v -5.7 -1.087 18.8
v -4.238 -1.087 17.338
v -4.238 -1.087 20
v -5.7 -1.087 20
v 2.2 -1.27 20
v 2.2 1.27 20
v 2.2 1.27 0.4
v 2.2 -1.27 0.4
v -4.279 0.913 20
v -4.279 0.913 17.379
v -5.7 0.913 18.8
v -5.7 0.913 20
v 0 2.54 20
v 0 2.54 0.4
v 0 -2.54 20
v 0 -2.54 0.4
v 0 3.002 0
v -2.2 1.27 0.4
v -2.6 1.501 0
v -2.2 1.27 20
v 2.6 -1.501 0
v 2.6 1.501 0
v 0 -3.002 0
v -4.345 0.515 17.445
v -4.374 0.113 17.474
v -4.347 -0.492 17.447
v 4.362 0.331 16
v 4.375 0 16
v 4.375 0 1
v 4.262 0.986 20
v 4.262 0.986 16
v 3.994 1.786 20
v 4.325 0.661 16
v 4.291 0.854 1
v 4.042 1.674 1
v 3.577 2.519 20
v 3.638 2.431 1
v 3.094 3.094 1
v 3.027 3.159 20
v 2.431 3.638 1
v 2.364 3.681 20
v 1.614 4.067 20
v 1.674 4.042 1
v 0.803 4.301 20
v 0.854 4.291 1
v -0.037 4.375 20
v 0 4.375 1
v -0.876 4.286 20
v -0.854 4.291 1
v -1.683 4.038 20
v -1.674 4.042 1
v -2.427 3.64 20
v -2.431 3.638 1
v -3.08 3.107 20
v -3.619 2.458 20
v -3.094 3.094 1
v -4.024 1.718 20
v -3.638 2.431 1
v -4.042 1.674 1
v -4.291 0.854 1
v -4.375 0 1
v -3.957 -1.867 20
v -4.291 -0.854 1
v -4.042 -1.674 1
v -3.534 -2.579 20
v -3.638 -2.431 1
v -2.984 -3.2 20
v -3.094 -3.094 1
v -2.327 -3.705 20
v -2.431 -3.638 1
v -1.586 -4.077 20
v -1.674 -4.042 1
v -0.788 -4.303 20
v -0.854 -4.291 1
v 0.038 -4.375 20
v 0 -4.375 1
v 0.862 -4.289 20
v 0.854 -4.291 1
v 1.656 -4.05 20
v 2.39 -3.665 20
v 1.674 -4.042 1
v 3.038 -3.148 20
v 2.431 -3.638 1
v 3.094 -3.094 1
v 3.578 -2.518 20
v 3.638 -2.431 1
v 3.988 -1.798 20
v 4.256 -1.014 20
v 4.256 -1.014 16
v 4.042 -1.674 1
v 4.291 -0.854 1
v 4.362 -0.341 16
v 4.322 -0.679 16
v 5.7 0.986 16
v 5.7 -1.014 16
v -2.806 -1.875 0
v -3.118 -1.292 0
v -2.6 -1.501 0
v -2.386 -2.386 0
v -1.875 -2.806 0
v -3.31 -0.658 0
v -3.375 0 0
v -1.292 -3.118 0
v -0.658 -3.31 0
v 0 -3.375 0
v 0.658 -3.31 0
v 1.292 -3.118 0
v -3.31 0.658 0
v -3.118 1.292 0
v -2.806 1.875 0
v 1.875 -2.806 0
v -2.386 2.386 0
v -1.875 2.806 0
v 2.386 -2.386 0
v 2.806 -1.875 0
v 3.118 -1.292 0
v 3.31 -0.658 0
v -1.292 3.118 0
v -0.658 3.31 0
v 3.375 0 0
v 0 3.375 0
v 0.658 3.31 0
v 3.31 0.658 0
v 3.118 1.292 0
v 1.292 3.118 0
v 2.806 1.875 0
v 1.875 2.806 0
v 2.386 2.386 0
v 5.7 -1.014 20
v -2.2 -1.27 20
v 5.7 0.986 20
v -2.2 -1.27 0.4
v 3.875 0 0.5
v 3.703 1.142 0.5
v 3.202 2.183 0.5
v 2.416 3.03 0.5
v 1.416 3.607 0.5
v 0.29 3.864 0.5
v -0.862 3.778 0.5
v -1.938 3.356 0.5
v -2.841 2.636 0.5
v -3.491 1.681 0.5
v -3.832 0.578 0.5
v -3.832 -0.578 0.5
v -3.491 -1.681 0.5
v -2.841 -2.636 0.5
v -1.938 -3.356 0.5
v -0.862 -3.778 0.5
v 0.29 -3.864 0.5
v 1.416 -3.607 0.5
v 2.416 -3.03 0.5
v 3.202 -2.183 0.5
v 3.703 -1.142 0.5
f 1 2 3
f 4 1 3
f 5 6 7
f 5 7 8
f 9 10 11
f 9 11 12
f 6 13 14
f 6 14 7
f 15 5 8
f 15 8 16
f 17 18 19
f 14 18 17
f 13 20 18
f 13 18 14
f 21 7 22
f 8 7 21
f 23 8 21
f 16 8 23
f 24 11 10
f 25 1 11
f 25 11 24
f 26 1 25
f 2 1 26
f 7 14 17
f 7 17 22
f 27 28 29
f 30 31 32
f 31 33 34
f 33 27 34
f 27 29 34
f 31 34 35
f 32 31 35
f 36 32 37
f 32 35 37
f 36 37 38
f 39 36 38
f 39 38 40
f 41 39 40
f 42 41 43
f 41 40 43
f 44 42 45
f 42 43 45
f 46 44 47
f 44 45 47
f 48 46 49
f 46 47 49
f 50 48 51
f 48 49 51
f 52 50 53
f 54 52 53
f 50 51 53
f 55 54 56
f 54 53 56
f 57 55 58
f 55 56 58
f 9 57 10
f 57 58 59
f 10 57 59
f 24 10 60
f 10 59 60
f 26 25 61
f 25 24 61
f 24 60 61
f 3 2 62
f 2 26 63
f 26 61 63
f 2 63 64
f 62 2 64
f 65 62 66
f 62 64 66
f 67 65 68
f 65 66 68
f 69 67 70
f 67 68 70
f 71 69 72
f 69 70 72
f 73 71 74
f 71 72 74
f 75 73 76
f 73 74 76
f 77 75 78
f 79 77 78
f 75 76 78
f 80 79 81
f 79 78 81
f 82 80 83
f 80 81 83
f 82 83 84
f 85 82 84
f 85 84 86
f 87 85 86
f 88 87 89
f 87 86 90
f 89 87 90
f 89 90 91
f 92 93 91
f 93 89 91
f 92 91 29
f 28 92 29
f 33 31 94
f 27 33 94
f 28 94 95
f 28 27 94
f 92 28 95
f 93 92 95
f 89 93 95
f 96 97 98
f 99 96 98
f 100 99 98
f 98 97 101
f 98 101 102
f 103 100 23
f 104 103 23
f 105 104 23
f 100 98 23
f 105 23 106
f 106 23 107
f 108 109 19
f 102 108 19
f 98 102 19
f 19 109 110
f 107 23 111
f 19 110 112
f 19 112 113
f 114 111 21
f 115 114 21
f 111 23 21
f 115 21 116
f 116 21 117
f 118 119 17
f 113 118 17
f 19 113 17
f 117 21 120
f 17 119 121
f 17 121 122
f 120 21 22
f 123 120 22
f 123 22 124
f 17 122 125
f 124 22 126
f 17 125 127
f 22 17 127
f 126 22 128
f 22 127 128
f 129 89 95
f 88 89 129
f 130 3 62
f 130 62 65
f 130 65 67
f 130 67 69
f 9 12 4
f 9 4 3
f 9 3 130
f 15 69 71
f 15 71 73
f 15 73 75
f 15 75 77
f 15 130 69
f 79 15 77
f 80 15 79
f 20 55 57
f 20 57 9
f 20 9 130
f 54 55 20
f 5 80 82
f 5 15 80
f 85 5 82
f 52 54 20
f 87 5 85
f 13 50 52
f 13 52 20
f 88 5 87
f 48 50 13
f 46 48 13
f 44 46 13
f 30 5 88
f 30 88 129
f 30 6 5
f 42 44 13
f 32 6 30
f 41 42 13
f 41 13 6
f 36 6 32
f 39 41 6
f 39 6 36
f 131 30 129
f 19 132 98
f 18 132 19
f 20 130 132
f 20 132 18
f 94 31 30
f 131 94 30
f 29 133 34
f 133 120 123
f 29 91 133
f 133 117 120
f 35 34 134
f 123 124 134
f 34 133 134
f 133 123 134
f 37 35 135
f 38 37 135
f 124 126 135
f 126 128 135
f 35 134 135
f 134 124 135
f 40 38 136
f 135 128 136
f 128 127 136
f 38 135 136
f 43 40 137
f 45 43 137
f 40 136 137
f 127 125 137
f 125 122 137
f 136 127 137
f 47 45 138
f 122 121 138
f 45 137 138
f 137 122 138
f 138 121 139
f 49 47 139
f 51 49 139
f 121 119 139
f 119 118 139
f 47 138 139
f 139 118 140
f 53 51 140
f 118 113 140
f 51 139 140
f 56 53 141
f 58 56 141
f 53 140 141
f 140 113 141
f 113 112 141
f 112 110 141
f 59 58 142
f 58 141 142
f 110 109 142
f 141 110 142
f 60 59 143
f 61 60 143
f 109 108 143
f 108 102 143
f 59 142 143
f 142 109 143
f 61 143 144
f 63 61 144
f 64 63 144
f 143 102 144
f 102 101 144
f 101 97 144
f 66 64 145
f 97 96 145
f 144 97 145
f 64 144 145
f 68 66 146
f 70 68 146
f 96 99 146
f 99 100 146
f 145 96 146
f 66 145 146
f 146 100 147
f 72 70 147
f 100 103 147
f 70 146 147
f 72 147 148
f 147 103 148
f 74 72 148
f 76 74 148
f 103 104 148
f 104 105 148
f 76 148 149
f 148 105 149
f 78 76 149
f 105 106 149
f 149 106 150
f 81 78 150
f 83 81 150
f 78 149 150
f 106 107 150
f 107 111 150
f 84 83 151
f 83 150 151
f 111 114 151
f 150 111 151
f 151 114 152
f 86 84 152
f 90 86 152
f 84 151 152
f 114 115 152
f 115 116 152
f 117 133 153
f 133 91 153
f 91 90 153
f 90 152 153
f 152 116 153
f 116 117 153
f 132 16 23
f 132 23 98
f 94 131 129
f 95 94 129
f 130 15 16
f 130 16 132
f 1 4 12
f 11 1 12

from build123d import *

# Parameters (mm, degrees)
F0_R        = 4.375
F1_DEPTH    = 20
F2_W        = 2
F2_H        = 4
F3_DEPTH    = 3.5
F4_W        = 2
F4_H        = 4
F5_DEPTH    = 3.5
F6_T4_DEPTH = 16.4014247326
F6_S5_R     = 4.375
F6_T6_DEPTH = 10
F7_SIZE     = 1
F8_SIZE     = 0.4


# Not quite as in the source:
# - a fillet or chamfer that OpenCascade refuses, or shapes differently, is made with other operations: its cross-section is extruded or revolved along the edge and cut away or added


with BuildPart() as f1:
    # F0 (on Top) → F1 (new body)
    with BuildSketch(Plane.XY):
        Circle(F0_R)
        Polygon((-2.2, -1.2701705922), (-2.2, 1.2701705922), (0, 2.5403411844), (2.2, 1.2701705922), (2.2, -1.2701705922), (0, -2.5403411844), align=None, mode=Mode.SUBTRACT)
    extrude(amount=F1_DEPTH)

    # F2 (on face) → F3 (join)
    with BuildSketch(Plane.YZ.offset(-2.2)):
        with Locations((-0.0866705922, 18)):
            Rectangle(F2_W, F2_H)
    extrude(amount=-F3_DEPTH)

    # F4 (on face) → F5 (join)
    with BuildSketch(Plane(origin=(2.2, 0, 0), x_dir=(0, -1, 0), z_dir=(-1, 0, 0))):
        with Locations((0.0136538511, 18)):
            Rectangle(F4_W, F4_H)
    extrude(amount=-F5_DEPTH)

    # F6: chamfer of 2.8 on 1 edges, made by hand


with BuildPart() as f6_tool2:
    # F6_s3 → F6_t4 (new body)
    with BuildSketch(Plane.XZ.offset(8.2873829585)):
        Polygon((-5.7, 18.8), (-2.9, 16), (-5.7, 16), align=None)
    extrude(amount=-F6_T4_DEPTH)

    # F6_s5 → F6_t6 (cut, symmetric)
    with BuildSketch(Plane.XY.offset(17.4)):
        Circle(F6_S5_R)
    extrude(amount=F6_T6_DEPTH, both=True, mode=Mode.SUBTRACT)


with BuildPart() as f1_1:
    add(f1.part)

    # F6_t1: cut F6_tool2
    add(f6_tool2.part, mode=Mode.SUBTRACT)

    # F7
    f7_edges = [f1_1.edges().sort_by_distance(p)[0] for p in [
        (-4.375, 0, 0),
    ]]
    chamfer(f7_edges, length=F7_SIZE)

    # F8
    f8_edges = [f1_1.edges().sort_by_distance(p)[0] for p in [
        (2.2, 0, 0),
        (1.1, -1.905256, 0),
        (-1.1, -1.905256, 0),
        (-2.2, 0, 0),
        (-1.1, 1.905256, 0),
        (1.1, 1.905256, 0),
    ]]
    chamfer(f8_edges, length=F8_SIZE)


solid = f1_1.part
